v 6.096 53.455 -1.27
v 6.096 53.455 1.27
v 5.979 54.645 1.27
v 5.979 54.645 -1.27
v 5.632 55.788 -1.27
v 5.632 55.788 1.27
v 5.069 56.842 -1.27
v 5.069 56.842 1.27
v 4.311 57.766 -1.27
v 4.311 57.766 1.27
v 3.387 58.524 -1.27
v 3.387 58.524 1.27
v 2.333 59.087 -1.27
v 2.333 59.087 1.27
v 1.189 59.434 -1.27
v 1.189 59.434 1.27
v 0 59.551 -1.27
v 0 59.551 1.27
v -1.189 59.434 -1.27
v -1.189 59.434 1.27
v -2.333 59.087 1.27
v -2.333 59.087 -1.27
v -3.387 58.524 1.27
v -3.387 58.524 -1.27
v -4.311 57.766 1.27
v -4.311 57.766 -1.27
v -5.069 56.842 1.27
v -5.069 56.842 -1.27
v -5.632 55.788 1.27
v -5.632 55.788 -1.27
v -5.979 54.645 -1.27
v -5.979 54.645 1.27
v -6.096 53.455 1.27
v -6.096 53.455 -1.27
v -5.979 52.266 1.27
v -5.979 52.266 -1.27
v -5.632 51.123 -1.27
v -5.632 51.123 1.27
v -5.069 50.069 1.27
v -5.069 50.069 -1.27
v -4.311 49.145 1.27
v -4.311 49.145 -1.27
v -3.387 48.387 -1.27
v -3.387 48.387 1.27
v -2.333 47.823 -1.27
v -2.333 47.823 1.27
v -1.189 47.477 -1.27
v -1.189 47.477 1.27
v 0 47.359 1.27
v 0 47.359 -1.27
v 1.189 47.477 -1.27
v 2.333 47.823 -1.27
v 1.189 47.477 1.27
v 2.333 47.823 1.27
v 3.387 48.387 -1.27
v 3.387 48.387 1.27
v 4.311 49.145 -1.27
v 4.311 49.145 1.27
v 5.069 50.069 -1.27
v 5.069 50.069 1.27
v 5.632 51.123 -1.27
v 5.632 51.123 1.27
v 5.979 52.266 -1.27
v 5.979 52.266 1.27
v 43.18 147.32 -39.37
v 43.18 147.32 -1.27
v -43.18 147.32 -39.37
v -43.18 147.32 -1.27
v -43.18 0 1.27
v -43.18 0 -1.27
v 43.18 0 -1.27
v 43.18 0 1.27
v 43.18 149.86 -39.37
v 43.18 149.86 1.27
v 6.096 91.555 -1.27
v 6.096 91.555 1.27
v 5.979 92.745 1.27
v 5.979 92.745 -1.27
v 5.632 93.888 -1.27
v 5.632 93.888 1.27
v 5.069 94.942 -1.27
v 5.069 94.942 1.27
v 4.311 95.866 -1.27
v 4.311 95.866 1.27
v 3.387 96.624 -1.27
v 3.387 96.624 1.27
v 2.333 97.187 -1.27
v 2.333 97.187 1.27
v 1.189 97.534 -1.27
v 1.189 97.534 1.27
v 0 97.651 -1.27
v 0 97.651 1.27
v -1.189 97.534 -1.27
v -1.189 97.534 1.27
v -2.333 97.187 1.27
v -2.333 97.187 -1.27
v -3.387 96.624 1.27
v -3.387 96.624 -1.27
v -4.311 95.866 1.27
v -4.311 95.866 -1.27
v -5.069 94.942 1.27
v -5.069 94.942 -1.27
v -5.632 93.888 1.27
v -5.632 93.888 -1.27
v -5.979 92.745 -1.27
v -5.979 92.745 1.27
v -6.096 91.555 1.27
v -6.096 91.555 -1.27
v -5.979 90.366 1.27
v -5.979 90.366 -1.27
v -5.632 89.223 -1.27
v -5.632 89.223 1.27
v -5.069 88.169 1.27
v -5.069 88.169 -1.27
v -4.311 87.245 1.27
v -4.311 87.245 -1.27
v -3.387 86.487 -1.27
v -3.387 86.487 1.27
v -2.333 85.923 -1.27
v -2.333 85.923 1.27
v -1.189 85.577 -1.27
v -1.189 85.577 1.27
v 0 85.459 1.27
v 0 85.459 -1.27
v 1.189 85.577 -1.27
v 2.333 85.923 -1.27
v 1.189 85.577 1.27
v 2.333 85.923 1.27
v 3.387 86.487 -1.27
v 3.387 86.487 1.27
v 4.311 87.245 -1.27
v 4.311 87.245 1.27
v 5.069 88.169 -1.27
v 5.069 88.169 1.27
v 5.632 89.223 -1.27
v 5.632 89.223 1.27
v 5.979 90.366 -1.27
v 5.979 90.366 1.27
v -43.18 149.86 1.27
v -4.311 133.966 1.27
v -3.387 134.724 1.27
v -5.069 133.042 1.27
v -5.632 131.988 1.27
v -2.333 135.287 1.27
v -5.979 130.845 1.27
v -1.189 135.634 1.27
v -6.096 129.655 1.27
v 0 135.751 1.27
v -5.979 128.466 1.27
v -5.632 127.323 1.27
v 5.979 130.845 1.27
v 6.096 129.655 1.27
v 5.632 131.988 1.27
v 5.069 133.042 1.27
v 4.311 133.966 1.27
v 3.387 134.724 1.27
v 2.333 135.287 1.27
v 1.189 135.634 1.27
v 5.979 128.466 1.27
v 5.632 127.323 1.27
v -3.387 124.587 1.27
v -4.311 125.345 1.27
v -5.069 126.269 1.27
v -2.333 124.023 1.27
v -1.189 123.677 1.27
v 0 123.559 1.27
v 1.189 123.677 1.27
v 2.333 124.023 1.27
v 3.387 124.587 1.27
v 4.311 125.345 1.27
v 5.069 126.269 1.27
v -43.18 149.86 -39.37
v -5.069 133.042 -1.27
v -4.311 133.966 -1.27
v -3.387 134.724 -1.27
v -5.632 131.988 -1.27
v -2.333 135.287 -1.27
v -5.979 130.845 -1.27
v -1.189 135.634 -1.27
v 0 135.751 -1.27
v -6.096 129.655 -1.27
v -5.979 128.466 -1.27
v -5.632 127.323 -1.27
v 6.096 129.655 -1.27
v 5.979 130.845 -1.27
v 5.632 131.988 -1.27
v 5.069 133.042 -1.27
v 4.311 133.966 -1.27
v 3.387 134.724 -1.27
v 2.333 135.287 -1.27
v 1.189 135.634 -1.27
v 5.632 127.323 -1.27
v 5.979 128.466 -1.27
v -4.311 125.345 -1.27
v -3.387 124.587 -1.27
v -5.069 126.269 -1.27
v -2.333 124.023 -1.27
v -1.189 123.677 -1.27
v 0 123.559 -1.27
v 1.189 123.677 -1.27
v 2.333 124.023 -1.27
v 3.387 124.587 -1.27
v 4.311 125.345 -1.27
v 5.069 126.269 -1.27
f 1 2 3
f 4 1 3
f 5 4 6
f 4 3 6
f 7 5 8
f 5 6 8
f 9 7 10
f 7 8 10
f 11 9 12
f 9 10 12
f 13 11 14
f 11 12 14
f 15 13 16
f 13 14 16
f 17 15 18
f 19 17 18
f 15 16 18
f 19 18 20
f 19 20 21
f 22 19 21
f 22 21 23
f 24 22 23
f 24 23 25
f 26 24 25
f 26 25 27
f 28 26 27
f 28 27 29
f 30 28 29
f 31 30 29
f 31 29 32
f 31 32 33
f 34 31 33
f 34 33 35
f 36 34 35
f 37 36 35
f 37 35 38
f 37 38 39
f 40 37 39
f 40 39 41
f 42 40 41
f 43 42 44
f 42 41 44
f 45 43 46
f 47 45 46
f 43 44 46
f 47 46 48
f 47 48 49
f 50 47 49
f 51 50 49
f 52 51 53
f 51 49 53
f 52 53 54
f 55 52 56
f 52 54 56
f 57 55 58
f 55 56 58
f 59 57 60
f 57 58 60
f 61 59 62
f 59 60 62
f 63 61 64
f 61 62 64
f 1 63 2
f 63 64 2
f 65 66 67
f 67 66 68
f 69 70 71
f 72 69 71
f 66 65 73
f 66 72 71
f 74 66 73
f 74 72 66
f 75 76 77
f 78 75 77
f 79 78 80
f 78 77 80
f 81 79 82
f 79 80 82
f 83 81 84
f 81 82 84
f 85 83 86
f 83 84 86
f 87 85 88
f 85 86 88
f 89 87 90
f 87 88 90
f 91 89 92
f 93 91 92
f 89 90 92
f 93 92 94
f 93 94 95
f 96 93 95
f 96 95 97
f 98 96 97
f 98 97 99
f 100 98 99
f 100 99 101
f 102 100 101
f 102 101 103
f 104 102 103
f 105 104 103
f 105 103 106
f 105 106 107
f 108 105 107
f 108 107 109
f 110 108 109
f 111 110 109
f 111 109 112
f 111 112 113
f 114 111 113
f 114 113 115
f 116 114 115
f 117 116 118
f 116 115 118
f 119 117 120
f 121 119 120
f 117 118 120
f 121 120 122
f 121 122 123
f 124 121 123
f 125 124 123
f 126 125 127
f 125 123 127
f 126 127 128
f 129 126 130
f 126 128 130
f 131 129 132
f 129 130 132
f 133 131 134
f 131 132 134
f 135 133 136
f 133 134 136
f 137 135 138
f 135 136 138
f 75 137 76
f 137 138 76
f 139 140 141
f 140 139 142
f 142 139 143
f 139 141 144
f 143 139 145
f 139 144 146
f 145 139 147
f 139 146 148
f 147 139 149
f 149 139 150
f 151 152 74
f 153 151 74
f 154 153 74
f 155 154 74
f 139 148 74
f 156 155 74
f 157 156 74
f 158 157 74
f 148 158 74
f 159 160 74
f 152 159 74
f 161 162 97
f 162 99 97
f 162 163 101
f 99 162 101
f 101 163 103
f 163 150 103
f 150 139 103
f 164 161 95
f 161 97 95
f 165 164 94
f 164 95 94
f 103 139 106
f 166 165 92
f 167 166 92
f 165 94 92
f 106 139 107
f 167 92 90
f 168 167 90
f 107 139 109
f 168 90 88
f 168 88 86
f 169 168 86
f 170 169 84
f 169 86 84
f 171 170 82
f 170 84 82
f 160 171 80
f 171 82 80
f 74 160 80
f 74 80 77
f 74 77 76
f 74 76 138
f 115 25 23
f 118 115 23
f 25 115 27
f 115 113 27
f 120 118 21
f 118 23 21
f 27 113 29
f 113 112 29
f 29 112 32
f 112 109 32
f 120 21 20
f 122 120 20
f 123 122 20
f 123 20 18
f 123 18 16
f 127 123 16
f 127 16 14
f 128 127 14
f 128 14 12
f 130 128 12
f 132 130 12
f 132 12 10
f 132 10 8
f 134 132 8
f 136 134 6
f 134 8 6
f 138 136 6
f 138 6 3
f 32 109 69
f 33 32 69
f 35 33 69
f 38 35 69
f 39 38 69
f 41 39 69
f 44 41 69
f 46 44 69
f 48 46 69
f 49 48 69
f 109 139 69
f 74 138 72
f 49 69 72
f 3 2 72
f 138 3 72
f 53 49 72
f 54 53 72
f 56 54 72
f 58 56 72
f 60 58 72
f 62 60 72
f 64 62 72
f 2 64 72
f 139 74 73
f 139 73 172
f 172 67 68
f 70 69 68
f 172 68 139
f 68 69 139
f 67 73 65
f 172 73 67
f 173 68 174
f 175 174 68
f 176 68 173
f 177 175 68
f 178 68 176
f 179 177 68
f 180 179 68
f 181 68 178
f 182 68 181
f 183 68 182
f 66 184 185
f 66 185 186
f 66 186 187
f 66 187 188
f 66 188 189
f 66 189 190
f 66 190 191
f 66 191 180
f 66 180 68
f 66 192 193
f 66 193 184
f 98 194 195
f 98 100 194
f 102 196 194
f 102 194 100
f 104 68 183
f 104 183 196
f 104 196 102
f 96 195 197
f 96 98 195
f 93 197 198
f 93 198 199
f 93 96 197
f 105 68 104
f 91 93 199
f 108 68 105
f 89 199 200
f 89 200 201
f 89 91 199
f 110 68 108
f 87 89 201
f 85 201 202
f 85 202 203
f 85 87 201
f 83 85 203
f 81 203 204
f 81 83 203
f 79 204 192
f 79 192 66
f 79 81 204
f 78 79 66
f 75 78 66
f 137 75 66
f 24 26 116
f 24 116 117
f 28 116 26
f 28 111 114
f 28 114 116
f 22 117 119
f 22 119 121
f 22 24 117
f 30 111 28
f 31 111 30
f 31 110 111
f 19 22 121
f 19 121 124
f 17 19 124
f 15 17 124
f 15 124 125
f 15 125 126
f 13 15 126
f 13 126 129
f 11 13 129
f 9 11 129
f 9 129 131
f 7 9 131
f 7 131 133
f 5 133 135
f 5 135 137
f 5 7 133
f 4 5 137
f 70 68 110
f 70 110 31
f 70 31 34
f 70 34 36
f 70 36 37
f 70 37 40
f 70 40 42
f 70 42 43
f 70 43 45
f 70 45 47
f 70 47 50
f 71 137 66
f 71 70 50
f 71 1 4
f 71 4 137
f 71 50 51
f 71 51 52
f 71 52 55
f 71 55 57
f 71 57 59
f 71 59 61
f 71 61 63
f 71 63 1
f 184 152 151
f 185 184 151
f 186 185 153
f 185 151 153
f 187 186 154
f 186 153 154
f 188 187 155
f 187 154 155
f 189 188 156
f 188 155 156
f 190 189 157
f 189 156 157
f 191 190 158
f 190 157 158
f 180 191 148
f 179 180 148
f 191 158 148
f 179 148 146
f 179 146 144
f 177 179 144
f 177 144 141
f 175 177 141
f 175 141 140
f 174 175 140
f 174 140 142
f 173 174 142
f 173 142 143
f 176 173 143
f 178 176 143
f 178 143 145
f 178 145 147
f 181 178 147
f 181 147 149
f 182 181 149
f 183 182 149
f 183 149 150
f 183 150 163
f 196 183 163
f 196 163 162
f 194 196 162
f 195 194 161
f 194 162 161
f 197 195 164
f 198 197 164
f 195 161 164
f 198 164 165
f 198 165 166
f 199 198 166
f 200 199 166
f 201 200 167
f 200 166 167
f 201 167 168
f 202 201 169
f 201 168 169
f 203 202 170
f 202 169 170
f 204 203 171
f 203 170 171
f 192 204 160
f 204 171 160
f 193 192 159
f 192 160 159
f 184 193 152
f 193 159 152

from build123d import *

# Parameters (mm, degrees)
SKETCH1_W           = 86.36
SKETCH1_H           = 2.54
BOSS_EXTRUDE1_DEPTH = 149.86
SKETCH2_W           = 86.36
SKETCH2_H           = 2.54
BOSS_EXTRUDE2_DEPTH = 38.1
SKETCH3_R           = 6.096
CUT_EXTRUDE1_DEPTH  = 41.64


with BuildPart() as part:
    # Sketch1 → Boss-Extrude1 (new body)
    with BuildSketch(Plane(origin=(0, 0, 0), x_dir=(1, 0, 0), z_dir=(0, 1, 0))):
        Rectangle(SKETCH1_W, SKETCH1_H)
    extrude(amount=BOSS_EXTRUDE1_DEPTH)

    # Sketch2 → Boss-Extrude2 (add)
    with BuildSketch(Plane(origin=(0, 0, -1.27), x_dir=(-1, 0, 0), z_dir=(0, 0, -1))):
        with Locations((0, 148.59)):
            Rectangle(SKETCH2_W, SKETCH2_H)
    extrude(amount=BOSS_EXTRUDE2_DEPTH)

    # Sketch3 → Cut-Extrude1 (cut, through all)
    with BuildSketch(Plane.XY.offset(1.27)):
        with Locations((0, 129.655411205)):
            Circle(SKETCH3_R)
        with Locations((0, 91.555411205)):
            Circle(SKETCH3_R)
        with Locations((0, 53.455411205)):
            Circle(SKETCH3_R)
    extrude(amount=-CUT_EXTRUDE1_DEPTH, mode=Mode.SUBTRACT)


solid = part.part
